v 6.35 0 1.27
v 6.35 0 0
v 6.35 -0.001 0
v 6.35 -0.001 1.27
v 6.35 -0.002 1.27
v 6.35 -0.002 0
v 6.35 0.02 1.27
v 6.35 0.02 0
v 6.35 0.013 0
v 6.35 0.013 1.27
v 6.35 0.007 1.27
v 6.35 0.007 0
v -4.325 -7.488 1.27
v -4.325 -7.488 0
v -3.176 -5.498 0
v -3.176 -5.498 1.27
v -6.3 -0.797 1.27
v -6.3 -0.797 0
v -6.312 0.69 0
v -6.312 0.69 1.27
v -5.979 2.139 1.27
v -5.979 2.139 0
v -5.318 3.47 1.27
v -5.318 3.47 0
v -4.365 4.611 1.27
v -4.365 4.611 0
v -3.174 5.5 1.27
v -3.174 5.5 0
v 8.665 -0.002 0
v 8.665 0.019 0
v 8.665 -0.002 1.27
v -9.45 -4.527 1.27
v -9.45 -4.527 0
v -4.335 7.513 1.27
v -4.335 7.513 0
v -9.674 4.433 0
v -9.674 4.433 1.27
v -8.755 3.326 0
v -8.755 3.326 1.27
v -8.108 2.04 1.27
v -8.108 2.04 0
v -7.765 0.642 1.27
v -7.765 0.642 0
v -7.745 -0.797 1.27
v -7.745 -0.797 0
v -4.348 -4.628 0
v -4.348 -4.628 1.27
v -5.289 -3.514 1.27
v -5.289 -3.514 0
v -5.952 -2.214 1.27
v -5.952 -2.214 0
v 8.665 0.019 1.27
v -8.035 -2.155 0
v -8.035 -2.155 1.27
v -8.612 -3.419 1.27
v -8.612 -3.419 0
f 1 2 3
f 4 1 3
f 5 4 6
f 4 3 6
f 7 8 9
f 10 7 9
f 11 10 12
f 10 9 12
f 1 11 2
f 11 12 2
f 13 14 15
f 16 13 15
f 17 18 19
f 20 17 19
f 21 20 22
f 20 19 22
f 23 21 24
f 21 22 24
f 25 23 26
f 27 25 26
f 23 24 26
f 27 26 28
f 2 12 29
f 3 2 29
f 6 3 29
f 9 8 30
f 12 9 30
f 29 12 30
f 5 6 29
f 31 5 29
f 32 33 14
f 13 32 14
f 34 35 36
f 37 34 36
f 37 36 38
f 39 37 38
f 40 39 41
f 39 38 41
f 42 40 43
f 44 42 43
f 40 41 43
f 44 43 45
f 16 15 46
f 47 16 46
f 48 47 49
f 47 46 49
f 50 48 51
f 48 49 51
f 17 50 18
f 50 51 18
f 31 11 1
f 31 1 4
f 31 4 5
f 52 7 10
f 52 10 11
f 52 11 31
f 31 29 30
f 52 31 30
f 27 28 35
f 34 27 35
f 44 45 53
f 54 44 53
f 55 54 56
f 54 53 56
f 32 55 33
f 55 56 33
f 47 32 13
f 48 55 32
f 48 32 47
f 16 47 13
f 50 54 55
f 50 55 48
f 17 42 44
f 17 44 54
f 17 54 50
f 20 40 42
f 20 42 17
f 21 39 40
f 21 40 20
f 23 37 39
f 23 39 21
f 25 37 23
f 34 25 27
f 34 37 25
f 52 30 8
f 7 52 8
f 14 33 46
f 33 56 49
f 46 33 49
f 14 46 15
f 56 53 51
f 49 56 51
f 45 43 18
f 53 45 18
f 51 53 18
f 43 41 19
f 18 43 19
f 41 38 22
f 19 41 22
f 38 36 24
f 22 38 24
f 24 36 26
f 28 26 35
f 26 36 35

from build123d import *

# Parameters (mm, degrees)
F1_DEPTH = 1.27


# Not quite as in the source:
# - a feature names something its author has since deleted; it is built from what else it names


with BuildPart() as f1:
    # F0 (on Top) → F1 (new body)
    with BuildSketch(Plane.XY):
        with BuildLine():
            ThreePointArc((6.3499692328, 0.0197671951), (6.3499923082, 0.0098836095), (6.35, 0))
            ThreePointArc((6.35, 0), (6.3499999511, -0.0007882849), (6.3499998043, -0.0015765697))
            Line((6.3499998043, -0.0015765697), (8.6649251995, -0.0021513164))
            Line((8.6649251995, -0.0021513164), (8.6649304987, 0.0191924395))
            Line((8.6649304987, 0.0191924395), (6.3499692328, 0.0197671951))
        make_face()
    extrude(amount=F1_DEPTH)


with BuildPart() as f1b:
    # F0 (on Top) → F1, piece 2 (new body)
    with BuildSketch(Plane.XY):
        with BuildLine():
            ThreePointArc((-6.2998185309, -0.7967348855), (-5.6876138678, 2.8237472428), (-3.1736345527, 5.5000494294))
            Line((-3.1736345527, 5.5000494294), (-4.3354020531, 7.5134440315))
            Line((-4.3354020531, 7.5134440315), (-9.6736101808, 4.43319503))
            ThreePointArc((-9.6736101808, 4.43319503), (-8.1076742802, 2.0401198083), (-7.7454316716, -0.7967348855))
            Line((-7.7454316716, -0.7967348855), (-6.2998185309, -0.7967348855))
        make_face()
        with BuildLine():
            Line((-4.3254468713, -7.4875999277), (-3.1763652516, -5.4984728597))
            ThreePointArc((-3.1763652516, -5.4984728597), (-5.28924378, -3.513744475), (-6.2998185309, -0.7967348855))
            Line((-6.2998185309, -0.7967348855), (-7.7454316716, -0.7967348855))
            ThreePointArc((-7.7454316716, -0.7967348855), (-8.2890892892, -2.8029936058), (-9.4496794179, -4.5274263273))
            Line((-9.4496794179, -4.5274263273), (-4.3254468713, -7.4875999277))
        make_face()
    extrude(amount=F1_DEPTH)


solid = Compound([f1.part, f1b.part])
